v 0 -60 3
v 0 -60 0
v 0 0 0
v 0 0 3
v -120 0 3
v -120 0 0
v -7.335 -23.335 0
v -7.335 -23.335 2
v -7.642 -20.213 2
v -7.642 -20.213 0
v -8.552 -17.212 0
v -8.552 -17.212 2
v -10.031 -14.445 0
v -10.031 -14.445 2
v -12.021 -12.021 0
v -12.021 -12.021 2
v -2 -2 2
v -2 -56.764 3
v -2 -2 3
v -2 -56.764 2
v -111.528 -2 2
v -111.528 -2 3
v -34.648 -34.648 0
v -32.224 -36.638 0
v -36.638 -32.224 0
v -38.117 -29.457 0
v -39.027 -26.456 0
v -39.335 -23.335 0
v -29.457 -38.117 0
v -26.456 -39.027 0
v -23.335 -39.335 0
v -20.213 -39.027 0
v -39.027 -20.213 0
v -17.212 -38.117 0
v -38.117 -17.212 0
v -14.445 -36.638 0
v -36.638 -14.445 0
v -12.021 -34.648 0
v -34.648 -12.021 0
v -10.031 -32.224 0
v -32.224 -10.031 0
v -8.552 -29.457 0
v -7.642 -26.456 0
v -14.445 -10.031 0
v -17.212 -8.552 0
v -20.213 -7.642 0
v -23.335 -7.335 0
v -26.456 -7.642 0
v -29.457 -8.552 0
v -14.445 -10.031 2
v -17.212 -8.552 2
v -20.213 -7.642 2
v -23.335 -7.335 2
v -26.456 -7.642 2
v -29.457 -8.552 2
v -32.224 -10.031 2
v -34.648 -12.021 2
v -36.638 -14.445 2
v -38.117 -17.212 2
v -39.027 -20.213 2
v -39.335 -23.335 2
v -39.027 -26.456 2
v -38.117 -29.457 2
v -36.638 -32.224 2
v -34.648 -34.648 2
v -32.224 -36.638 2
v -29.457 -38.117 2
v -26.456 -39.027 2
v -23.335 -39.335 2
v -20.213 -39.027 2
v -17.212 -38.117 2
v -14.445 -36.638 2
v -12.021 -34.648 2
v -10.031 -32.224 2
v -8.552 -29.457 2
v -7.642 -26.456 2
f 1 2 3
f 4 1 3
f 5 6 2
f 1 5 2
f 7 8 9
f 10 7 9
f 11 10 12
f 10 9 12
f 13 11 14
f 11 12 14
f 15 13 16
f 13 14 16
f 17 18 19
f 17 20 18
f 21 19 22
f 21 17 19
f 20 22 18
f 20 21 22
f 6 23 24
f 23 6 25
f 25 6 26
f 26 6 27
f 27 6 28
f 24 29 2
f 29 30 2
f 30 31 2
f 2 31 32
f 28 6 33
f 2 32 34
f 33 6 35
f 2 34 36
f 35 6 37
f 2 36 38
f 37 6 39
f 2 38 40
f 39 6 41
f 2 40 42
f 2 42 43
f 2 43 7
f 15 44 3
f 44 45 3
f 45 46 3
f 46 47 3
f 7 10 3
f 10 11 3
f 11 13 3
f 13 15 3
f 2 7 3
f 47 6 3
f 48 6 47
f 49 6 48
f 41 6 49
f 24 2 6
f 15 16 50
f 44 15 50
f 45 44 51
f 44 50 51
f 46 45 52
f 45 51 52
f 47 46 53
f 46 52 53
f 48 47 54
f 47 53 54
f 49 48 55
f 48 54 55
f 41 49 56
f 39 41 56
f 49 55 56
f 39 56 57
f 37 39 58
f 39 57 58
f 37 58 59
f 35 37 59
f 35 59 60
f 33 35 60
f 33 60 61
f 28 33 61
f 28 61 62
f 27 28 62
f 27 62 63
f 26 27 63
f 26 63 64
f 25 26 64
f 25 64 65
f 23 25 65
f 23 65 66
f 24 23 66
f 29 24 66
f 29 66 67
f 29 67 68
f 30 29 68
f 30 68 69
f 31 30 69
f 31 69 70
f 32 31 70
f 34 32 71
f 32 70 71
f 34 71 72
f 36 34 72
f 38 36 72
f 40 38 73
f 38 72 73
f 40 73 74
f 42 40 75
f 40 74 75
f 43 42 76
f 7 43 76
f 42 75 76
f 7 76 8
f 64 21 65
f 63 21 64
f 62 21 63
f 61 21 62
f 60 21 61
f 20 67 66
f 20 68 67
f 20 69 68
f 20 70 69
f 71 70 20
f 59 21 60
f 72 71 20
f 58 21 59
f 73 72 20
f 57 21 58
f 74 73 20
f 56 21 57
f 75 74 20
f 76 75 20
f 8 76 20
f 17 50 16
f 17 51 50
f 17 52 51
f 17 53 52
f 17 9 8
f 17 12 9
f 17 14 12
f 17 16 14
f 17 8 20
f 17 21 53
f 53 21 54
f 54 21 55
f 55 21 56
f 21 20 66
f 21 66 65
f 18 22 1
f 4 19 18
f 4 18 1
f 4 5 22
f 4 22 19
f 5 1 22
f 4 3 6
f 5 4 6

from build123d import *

# Parameters (mm, degrees)
F1_DEPTH = 3
F2_T     = -2
F4_DEPTH = 2.001


# Not quite as in the source:
# - ends of sketch curves that miss each other by under 0.0002 mm in the source are joined


with BuildPart() as f1:
    # F0 (on Top) → F1 (new body)
    with BuildSketch(Plane.XY):
        Polygon((0, -60), (0, 0), (-120, 0), align=None)
    extrude(amount=F1_DEPTH)

    # F2
    f2_openings = [f1.faces().sort_by_distance(p)[0] for p in [
        (-40, -20, 3),
    ]]
    offset(amount=F2_T, openings=f2_openings)

    # F3 (on face) → F4 (cut, through all)
    with BuildSketch(Plane.XY.offset(2)):
        with BuildLine():
            ThreePointArc((-12.0208152802, -12.0208152802), (-38.1165962993, -29.457458697), (-7.3345237792, -23.3345237792))
            ThreePointArc((-7.3345237792, -23.3345237792), (-8.552451259, -17.2115888613), (-12.0208152802, -12.0208152802))
        make_face()
    extrude(amount=-F4_DEPTH, mode=Mode.SUBTRACT)


solid = f1.part
